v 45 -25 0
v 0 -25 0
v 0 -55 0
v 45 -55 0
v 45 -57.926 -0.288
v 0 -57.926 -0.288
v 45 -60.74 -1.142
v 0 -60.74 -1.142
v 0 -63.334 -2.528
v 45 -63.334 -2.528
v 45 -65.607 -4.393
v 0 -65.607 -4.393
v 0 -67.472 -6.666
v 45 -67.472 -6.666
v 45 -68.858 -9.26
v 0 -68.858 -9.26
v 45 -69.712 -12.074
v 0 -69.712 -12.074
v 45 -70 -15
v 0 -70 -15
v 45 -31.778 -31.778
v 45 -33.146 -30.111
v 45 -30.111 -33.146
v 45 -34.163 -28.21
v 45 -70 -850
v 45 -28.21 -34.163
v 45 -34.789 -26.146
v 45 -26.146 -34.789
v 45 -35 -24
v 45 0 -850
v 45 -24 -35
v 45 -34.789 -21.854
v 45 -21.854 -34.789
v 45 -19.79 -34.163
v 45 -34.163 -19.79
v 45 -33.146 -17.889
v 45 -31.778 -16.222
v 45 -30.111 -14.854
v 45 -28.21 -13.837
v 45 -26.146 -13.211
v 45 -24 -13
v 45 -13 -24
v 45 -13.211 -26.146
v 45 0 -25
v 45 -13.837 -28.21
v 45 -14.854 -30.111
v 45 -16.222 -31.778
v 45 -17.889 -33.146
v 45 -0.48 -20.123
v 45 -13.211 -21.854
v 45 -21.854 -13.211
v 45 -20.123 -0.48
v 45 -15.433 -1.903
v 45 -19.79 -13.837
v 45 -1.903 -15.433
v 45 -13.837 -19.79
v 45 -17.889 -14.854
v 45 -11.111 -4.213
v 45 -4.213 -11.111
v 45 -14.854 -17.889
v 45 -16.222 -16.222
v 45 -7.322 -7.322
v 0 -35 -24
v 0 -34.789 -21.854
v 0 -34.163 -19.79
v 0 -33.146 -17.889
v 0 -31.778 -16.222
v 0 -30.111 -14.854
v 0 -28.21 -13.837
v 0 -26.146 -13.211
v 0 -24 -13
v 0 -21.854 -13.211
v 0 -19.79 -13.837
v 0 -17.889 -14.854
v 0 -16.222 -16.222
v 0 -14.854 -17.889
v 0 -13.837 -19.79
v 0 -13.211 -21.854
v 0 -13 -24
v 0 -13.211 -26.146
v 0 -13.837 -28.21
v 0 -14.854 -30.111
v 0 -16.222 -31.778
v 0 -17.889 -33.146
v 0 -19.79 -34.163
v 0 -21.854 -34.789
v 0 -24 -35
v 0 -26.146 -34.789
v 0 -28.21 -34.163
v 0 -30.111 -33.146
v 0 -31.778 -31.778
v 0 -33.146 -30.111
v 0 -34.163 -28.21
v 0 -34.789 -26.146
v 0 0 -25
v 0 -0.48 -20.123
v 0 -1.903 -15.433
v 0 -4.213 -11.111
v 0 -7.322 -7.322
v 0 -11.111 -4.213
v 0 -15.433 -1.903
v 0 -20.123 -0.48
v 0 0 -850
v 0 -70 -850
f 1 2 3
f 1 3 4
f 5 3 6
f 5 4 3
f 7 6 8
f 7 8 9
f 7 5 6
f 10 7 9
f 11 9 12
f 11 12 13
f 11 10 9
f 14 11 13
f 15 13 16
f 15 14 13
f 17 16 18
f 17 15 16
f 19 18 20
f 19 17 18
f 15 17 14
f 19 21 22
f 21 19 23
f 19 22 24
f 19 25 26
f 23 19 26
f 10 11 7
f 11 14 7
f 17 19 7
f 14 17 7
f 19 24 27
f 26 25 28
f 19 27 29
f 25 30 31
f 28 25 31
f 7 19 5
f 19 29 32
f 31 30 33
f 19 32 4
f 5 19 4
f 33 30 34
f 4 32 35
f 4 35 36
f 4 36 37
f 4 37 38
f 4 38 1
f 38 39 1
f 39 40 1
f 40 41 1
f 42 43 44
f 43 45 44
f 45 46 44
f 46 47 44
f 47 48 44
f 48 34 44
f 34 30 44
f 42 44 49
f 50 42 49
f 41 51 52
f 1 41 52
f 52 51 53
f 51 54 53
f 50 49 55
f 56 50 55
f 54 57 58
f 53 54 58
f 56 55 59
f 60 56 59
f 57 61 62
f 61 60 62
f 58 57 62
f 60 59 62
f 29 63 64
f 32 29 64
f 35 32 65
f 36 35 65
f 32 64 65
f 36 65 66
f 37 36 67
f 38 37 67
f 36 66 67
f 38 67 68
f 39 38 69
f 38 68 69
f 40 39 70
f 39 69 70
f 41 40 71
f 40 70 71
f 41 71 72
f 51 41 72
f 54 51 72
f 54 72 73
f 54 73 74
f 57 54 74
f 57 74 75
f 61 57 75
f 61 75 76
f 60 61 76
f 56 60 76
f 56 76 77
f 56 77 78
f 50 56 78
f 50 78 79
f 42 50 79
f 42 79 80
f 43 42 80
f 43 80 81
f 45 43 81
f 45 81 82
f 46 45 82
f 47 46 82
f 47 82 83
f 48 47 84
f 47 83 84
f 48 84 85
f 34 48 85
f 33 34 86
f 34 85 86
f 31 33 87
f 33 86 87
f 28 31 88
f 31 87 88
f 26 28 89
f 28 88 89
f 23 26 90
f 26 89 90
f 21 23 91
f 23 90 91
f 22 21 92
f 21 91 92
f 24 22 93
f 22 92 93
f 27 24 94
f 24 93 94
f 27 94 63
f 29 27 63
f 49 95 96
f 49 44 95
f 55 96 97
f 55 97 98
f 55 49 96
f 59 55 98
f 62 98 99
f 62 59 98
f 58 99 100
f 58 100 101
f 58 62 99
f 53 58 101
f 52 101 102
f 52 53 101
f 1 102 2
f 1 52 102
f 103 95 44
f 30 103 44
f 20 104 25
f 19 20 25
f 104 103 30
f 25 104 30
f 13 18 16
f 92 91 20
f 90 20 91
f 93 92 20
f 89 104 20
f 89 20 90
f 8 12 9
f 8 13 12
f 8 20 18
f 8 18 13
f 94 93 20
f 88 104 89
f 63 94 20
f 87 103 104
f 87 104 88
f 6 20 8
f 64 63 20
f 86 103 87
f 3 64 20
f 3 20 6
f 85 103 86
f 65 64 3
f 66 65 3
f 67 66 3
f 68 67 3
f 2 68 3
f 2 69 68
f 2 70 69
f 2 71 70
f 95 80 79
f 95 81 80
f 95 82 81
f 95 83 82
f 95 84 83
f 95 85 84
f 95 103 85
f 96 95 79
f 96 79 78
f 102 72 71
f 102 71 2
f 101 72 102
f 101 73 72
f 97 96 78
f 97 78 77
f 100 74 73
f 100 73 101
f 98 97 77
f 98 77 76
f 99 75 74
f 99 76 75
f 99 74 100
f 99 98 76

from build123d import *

# Parameters (mm, degrees)
F0_W     = 45
F0_H     = 850
F1_DEPTH = 70
F2_R     = 11
F3_DEPTH = 45.001
F4_R     = 25
F5_R     = 15


with BuildPart() as f1:
    # F0 (on Front) → F1 (new body)
    with BuildSketch(Plane.XZ):
        with Locations((22.5, -425)):
            Rectangle(F0_W, F0_H)
    extrude(amount=F1_DEPTH)

    # F2 (on face) → F3 (cut, through all)
    with BuildSketch(Plane(origin=(0, 0, 0), x_dir=(0, -1, 0), z_dir=(-1, 0, 0))):
        with Locations((24, -24)):
            Circle(F2_R)
    extrude(amount=-F3_DEPTH, mode=Mode.SUBTRACT)

    # F4
    f4_edges = [f1.edges().sort_by_distance(p)[0] for p in [
        (22.5, 0, 0),
    ]]
    fillet(f4_edges, radius=F4_R)

    # F5
    f5_edges = [f1.edges().sort_by_distance(p)[0] for p in [
        (22.5, -70, 0),
    ]]
    fillet(f5_edges, radius=F5_R)


solid = f1.part
